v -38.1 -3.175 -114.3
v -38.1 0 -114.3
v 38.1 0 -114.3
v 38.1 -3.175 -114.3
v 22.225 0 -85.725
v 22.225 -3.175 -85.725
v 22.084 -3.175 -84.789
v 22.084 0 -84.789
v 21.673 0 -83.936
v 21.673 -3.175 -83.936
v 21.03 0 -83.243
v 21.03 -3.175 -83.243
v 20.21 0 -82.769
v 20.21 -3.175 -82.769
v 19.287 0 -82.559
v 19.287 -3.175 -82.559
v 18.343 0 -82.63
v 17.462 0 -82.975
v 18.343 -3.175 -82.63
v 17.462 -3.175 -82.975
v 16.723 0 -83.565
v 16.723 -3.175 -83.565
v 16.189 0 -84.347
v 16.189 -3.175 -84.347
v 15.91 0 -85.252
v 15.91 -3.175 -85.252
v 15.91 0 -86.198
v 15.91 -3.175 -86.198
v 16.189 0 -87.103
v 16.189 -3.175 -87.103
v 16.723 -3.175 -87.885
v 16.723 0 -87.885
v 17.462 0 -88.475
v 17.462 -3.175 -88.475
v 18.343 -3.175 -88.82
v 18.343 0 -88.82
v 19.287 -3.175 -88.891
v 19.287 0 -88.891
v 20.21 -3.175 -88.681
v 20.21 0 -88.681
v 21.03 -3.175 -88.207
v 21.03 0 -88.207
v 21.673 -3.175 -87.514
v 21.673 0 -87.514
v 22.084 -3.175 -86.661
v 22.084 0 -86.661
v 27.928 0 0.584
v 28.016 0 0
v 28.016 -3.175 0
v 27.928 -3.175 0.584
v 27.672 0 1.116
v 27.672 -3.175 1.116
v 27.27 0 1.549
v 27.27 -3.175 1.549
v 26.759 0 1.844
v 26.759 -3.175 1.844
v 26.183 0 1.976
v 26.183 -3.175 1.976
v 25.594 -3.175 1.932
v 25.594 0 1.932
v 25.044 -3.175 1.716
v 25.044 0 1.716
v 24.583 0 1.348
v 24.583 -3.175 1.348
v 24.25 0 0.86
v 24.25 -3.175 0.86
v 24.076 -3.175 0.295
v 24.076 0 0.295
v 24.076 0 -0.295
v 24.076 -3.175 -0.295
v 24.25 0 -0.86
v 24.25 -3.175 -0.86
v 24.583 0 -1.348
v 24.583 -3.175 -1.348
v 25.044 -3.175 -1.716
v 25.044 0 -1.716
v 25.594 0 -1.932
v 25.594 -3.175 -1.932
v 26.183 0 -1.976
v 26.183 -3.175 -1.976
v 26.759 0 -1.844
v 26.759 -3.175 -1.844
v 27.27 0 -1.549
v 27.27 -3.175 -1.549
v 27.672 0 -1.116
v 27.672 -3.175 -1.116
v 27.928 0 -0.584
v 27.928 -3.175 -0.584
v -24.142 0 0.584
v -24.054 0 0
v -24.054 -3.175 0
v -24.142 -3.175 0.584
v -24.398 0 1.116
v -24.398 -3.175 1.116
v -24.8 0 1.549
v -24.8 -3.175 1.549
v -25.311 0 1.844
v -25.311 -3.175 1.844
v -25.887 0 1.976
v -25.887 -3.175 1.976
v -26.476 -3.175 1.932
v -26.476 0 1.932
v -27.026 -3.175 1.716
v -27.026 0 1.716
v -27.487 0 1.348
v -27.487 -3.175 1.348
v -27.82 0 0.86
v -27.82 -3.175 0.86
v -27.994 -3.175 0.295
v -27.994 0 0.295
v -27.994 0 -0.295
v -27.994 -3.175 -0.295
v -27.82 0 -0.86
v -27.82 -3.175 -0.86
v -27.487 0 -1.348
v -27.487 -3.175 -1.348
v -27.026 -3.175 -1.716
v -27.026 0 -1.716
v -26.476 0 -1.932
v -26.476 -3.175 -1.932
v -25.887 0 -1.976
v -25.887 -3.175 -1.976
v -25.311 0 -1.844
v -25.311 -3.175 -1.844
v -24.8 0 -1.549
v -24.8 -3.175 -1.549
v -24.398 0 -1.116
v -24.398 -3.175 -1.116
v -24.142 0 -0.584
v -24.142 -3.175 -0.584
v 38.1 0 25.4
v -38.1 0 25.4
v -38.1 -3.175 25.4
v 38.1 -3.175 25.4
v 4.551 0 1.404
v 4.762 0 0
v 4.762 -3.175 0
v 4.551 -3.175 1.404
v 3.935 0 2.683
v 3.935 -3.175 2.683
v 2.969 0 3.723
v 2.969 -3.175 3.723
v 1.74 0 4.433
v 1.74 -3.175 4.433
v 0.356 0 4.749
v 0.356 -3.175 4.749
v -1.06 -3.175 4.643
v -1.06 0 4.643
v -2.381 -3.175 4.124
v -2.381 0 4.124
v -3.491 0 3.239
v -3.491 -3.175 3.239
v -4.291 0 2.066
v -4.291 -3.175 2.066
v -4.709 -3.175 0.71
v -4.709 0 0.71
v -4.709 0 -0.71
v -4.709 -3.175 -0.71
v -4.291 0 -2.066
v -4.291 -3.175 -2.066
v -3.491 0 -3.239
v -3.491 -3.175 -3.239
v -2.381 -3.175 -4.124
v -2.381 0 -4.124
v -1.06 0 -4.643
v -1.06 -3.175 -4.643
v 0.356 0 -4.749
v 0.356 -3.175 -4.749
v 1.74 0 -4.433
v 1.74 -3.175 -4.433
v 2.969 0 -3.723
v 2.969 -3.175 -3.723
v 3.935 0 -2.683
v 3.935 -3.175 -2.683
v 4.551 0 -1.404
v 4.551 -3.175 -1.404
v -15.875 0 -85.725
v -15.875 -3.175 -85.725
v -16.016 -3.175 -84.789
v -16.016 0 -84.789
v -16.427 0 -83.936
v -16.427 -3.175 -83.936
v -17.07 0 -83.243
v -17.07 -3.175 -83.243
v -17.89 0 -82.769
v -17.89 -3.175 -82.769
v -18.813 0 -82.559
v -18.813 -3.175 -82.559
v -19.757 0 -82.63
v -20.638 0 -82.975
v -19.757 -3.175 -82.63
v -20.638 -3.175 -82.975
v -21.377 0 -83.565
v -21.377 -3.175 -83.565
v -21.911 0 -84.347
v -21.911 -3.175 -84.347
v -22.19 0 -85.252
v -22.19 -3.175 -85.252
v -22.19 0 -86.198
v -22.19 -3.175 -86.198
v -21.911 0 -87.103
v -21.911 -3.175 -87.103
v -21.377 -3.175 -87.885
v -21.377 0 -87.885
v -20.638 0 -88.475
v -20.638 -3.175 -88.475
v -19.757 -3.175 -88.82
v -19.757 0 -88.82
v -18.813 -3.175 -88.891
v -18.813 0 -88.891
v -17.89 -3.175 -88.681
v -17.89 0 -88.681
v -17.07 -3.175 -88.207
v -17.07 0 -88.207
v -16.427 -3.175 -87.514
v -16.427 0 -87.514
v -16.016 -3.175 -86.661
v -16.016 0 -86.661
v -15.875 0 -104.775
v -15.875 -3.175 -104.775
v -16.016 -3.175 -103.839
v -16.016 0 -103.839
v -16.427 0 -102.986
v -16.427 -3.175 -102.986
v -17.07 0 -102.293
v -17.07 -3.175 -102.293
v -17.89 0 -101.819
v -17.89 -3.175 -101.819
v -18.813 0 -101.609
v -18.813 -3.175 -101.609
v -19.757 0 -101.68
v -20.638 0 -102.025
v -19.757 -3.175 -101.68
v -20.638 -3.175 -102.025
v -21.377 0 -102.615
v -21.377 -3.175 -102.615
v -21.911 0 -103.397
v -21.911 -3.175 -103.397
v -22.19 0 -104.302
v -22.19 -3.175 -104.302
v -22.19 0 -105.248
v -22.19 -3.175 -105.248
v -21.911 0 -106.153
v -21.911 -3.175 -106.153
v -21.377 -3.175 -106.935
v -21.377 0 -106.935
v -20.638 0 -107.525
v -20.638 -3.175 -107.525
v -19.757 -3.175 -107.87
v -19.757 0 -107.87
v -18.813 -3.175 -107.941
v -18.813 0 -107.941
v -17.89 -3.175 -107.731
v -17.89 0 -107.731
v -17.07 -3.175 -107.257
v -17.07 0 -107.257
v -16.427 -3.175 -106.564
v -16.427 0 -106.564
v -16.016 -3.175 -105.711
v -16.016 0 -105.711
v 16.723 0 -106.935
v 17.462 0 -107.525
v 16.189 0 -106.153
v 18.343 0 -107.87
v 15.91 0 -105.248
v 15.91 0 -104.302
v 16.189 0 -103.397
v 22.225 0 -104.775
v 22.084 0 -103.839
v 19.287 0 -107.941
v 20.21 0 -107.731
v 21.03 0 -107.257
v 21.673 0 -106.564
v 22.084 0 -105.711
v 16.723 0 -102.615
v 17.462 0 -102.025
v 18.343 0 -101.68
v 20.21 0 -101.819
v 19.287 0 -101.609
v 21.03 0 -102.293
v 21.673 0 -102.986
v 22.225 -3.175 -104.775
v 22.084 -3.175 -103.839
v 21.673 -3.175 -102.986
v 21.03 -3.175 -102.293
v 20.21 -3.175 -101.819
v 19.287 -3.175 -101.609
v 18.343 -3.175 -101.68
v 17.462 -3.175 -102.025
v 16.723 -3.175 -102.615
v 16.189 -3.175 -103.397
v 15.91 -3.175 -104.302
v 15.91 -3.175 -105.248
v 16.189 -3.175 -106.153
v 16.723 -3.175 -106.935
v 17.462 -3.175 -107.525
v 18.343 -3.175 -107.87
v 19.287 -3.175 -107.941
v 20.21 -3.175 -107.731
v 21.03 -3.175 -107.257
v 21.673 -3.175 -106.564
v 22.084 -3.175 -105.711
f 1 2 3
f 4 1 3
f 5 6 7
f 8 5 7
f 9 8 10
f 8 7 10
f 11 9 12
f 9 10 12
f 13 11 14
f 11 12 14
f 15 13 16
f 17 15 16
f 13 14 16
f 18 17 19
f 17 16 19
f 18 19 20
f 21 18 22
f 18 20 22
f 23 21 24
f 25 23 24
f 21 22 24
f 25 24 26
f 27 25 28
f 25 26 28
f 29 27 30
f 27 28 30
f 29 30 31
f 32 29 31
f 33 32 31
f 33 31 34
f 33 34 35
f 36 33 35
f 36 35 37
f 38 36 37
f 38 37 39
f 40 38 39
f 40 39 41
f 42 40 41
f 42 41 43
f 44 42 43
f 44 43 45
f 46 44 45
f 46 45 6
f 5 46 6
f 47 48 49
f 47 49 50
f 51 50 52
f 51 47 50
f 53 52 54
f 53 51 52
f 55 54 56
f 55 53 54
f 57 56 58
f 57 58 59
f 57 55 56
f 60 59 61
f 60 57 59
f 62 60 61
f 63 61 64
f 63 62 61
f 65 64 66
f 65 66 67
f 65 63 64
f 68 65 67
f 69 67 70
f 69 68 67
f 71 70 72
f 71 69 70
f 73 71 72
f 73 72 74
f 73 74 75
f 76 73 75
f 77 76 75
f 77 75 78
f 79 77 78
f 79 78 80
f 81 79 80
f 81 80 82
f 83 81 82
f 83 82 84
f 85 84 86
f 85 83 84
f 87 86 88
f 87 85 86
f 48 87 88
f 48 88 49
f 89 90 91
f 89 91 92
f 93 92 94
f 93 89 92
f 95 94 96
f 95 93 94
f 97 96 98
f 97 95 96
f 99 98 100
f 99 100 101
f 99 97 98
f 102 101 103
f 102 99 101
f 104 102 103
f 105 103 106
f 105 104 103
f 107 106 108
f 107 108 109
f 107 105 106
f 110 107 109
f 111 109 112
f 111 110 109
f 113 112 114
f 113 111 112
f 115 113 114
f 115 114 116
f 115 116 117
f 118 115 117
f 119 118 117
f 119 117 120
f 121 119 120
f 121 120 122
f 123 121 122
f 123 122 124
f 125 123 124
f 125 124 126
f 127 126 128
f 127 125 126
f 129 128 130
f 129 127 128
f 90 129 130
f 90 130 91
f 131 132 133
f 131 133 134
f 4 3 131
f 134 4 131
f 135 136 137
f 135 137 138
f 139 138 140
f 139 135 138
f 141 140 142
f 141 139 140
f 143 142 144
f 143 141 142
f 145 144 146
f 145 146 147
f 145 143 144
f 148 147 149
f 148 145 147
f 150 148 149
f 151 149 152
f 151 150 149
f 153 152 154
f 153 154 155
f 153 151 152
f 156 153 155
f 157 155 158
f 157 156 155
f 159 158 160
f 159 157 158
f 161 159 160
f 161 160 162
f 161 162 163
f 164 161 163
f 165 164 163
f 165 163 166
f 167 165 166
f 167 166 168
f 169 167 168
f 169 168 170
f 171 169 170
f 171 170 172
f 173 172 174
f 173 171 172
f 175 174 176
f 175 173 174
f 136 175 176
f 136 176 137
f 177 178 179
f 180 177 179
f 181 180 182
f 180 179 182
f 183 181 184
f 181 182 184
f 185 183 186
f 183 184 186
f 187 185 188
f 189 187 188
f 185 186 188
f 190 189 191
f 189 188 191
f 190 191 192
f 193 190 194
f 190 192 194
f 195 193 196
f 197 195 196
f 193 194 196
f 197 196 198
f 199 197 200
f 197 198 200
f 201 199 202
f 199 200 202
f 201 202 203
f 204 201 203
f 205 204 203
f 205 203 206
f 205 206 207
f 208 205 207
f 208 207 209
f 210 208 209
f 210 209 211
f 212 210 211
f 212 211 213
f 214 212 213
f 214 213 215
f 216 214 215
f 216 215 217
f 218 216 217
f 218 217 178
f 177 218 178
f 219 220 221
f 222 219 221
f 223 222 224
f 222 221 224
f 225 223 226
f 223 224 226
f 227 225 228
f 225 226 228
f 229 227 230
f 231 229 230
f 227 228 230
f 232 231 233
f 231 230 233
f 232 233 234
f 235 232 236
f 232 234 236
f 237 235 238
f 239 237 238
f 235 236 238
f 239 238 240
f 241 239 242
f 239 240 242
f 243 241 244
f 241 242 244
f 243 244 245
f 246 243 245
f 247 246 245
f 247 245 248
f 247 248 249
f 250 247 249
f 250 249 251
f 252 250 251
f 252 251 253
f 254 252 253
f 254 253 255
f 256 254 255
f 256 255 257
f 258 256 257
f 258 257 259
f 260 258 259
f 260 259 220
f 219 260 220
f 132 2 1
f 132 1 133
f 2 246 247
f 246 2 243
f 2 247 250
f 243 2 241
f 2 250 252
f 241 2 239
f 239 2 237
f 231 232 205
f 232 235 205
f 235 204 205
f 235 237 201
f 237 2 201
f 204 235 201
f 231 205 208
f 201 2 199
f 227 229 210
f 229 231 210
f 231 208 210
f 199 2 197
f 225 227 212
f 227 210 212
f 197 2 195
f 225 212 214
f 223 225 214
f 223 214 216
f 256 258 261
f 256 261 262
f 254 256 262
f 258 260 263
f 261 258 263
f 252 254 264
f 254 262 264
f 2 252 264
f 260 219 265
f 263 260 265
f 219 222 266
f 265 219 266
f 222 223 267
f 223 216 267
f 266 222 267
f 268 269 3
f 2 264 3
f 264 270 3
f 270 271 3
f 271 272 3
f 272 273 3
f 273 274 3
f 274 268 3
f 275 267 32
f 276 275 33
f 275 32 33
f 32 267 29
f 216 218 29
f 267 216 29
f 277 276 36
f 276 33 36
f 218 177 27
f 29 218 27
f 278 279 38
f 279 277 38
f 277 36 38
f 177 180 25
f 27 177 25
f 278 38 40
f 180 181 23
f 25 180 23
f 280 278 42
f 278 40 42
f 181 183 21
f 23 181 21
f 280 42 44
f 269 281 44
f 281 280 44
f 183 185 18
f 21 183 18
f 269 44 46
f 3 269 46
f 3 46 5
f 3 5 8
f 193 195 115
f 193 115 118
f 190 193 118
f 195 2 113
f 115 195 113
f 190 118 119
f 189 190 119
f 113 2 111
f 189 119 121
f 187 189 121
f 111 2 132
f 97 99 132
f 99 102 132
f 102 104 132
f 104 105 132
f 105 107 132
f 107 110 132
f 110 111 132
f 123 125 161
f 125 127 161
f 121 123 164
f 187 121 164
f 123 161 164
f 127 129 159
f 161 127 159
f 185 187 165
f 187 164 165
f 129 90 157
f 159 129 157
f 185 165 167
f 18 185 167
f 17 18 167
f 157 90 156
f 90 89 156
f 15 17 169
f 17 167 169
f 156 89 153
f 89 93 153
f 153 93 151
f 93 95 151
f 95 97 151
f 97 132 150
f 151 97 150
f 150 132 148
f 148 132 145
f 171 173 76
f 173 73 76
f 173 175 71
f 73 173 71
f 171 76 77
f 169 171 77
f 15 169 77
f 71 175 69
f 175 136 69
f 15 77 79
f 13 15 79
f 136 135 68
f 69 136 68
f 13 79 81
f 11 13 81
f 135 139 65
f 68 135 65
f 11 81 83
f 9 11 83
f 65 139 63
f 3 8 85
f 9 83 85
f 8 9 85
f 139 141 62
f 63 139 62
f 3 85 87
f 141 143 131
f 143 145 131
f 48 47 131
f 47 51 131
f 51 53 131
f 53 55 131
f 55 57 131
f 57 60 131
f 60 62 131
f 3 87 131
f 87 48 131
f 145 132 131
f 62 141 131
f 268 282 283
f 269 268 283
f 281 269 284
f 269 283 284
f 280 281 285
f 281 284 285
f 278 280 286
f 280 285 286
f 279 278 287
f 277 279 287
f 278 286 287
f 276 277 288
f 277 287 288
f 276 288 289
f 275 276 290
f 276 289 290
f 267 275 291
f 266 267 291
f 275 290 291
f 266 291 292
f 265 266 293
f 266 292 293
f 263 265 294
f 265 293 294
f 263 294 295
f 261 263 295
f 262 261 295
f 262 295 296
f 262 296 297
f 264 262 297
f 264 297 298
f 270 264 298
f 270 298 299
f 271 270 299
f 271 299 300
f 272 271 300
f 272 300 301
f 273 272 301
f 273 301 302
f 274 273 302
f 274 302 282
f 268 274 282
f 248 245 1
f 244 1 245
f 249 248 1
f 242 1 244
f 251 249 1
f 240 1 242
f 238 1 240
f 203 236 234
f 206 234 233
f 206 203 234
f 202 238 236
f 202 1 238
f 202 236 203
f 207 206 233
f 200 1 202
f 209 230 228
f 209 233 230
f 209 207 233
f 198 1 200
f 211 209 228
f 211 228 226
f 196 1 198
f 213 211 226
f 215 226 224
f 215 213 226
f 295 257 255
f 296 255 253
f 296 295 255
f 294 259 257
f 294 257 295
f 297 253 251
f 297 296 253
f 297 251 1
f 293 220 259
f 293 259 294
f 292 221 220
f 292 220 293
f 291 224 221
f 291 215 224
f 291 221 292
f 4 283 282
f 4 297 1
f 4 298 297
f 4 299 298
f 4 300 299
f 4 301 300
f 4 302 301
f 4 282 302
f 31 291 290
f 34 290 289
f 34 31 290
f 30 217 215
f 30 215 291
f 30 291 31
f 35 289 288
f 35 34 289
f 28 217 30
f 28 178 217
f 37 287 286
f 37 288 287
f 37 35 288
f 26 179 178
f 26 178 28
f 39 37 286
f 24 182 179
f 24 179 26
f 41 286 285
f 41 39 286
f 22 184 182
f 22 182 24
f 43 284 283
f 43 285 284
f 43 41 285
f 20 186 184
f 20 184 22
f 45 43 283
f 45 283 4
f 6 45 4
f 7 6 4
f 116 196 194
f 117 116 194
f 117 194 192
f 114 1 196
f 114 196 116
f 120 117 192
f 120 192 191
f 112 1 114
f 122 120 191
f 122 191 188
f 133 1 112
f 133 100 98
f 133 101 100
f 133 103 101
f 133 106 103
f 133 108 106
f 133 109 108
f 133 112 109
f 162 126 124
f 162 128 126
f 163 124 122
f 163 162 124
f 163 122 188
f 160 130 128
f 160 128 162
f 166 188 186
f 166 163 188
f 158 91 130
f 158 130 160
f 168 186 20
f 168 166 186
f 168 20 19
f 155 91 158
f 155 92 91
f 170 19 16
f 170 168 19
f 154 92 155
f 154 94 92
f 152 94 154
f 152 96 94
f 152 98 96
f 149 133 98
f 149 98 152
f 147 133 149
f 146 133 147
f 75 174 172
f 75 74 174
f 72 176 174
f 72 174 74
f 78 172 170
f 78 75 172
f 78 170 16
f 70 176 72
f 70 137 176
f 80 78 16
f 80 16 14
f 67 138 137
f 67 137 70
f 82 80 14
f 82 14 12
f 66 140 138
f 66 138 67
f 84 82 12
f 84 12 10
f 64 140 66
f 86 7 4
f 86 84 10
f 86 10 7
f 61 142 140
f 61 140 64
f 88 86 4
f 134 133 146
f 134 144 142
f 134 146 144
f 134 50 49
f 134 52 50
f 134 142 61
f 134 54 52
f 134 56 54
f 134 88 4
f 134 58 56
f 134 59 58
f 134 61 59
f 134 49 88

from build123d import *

# Parameters (mm, degrees)
F0_W     = 76.2
F0_H     = 139.7
F0_R     = 1.9812
F0_R_2   = 4.7625
F1_DEPTH = 3.175
F2_R     = 3.175
F3_DEPTH = 3.176


with BuildPart() as f1:
    # F0 (on Front) → F1 (new body)
    with BuildSketch(Plane.XZ):
        with Locations((0, -44.45)):
            Rectangle(F0_W, F0_H)
        with Locations((-26.035, 0)):
            Circle(F0_R, mode=Mode.SUBTRACT)
        Circle(F0_R_2, mode=Mode.SUBTRACT)
        with Locations((26.035, 0)):
            Circle(F0_R, mode=Mode.SUBTRACT)
    extrude(amount=F1_DEPTH)

    # F2 (on face) → F3 (cut, through all)
    with BuildSketch(Plane.XZ.offset(3.175)):
        with Locations((19.05, -85.725)):
            Circle(F2_R)
        with Locations((19.05, -104.775)):
            Circle(F2_R)
        with Locations((-19.05, -85.725)):
            Circle(F2_R)
        with Locations((-19.05, -104.775)):
            Circle(F2_R)
    extrude(amount=-F3_DEPTH, mode=Mode.SUBTRACT)


solid = f1.part
